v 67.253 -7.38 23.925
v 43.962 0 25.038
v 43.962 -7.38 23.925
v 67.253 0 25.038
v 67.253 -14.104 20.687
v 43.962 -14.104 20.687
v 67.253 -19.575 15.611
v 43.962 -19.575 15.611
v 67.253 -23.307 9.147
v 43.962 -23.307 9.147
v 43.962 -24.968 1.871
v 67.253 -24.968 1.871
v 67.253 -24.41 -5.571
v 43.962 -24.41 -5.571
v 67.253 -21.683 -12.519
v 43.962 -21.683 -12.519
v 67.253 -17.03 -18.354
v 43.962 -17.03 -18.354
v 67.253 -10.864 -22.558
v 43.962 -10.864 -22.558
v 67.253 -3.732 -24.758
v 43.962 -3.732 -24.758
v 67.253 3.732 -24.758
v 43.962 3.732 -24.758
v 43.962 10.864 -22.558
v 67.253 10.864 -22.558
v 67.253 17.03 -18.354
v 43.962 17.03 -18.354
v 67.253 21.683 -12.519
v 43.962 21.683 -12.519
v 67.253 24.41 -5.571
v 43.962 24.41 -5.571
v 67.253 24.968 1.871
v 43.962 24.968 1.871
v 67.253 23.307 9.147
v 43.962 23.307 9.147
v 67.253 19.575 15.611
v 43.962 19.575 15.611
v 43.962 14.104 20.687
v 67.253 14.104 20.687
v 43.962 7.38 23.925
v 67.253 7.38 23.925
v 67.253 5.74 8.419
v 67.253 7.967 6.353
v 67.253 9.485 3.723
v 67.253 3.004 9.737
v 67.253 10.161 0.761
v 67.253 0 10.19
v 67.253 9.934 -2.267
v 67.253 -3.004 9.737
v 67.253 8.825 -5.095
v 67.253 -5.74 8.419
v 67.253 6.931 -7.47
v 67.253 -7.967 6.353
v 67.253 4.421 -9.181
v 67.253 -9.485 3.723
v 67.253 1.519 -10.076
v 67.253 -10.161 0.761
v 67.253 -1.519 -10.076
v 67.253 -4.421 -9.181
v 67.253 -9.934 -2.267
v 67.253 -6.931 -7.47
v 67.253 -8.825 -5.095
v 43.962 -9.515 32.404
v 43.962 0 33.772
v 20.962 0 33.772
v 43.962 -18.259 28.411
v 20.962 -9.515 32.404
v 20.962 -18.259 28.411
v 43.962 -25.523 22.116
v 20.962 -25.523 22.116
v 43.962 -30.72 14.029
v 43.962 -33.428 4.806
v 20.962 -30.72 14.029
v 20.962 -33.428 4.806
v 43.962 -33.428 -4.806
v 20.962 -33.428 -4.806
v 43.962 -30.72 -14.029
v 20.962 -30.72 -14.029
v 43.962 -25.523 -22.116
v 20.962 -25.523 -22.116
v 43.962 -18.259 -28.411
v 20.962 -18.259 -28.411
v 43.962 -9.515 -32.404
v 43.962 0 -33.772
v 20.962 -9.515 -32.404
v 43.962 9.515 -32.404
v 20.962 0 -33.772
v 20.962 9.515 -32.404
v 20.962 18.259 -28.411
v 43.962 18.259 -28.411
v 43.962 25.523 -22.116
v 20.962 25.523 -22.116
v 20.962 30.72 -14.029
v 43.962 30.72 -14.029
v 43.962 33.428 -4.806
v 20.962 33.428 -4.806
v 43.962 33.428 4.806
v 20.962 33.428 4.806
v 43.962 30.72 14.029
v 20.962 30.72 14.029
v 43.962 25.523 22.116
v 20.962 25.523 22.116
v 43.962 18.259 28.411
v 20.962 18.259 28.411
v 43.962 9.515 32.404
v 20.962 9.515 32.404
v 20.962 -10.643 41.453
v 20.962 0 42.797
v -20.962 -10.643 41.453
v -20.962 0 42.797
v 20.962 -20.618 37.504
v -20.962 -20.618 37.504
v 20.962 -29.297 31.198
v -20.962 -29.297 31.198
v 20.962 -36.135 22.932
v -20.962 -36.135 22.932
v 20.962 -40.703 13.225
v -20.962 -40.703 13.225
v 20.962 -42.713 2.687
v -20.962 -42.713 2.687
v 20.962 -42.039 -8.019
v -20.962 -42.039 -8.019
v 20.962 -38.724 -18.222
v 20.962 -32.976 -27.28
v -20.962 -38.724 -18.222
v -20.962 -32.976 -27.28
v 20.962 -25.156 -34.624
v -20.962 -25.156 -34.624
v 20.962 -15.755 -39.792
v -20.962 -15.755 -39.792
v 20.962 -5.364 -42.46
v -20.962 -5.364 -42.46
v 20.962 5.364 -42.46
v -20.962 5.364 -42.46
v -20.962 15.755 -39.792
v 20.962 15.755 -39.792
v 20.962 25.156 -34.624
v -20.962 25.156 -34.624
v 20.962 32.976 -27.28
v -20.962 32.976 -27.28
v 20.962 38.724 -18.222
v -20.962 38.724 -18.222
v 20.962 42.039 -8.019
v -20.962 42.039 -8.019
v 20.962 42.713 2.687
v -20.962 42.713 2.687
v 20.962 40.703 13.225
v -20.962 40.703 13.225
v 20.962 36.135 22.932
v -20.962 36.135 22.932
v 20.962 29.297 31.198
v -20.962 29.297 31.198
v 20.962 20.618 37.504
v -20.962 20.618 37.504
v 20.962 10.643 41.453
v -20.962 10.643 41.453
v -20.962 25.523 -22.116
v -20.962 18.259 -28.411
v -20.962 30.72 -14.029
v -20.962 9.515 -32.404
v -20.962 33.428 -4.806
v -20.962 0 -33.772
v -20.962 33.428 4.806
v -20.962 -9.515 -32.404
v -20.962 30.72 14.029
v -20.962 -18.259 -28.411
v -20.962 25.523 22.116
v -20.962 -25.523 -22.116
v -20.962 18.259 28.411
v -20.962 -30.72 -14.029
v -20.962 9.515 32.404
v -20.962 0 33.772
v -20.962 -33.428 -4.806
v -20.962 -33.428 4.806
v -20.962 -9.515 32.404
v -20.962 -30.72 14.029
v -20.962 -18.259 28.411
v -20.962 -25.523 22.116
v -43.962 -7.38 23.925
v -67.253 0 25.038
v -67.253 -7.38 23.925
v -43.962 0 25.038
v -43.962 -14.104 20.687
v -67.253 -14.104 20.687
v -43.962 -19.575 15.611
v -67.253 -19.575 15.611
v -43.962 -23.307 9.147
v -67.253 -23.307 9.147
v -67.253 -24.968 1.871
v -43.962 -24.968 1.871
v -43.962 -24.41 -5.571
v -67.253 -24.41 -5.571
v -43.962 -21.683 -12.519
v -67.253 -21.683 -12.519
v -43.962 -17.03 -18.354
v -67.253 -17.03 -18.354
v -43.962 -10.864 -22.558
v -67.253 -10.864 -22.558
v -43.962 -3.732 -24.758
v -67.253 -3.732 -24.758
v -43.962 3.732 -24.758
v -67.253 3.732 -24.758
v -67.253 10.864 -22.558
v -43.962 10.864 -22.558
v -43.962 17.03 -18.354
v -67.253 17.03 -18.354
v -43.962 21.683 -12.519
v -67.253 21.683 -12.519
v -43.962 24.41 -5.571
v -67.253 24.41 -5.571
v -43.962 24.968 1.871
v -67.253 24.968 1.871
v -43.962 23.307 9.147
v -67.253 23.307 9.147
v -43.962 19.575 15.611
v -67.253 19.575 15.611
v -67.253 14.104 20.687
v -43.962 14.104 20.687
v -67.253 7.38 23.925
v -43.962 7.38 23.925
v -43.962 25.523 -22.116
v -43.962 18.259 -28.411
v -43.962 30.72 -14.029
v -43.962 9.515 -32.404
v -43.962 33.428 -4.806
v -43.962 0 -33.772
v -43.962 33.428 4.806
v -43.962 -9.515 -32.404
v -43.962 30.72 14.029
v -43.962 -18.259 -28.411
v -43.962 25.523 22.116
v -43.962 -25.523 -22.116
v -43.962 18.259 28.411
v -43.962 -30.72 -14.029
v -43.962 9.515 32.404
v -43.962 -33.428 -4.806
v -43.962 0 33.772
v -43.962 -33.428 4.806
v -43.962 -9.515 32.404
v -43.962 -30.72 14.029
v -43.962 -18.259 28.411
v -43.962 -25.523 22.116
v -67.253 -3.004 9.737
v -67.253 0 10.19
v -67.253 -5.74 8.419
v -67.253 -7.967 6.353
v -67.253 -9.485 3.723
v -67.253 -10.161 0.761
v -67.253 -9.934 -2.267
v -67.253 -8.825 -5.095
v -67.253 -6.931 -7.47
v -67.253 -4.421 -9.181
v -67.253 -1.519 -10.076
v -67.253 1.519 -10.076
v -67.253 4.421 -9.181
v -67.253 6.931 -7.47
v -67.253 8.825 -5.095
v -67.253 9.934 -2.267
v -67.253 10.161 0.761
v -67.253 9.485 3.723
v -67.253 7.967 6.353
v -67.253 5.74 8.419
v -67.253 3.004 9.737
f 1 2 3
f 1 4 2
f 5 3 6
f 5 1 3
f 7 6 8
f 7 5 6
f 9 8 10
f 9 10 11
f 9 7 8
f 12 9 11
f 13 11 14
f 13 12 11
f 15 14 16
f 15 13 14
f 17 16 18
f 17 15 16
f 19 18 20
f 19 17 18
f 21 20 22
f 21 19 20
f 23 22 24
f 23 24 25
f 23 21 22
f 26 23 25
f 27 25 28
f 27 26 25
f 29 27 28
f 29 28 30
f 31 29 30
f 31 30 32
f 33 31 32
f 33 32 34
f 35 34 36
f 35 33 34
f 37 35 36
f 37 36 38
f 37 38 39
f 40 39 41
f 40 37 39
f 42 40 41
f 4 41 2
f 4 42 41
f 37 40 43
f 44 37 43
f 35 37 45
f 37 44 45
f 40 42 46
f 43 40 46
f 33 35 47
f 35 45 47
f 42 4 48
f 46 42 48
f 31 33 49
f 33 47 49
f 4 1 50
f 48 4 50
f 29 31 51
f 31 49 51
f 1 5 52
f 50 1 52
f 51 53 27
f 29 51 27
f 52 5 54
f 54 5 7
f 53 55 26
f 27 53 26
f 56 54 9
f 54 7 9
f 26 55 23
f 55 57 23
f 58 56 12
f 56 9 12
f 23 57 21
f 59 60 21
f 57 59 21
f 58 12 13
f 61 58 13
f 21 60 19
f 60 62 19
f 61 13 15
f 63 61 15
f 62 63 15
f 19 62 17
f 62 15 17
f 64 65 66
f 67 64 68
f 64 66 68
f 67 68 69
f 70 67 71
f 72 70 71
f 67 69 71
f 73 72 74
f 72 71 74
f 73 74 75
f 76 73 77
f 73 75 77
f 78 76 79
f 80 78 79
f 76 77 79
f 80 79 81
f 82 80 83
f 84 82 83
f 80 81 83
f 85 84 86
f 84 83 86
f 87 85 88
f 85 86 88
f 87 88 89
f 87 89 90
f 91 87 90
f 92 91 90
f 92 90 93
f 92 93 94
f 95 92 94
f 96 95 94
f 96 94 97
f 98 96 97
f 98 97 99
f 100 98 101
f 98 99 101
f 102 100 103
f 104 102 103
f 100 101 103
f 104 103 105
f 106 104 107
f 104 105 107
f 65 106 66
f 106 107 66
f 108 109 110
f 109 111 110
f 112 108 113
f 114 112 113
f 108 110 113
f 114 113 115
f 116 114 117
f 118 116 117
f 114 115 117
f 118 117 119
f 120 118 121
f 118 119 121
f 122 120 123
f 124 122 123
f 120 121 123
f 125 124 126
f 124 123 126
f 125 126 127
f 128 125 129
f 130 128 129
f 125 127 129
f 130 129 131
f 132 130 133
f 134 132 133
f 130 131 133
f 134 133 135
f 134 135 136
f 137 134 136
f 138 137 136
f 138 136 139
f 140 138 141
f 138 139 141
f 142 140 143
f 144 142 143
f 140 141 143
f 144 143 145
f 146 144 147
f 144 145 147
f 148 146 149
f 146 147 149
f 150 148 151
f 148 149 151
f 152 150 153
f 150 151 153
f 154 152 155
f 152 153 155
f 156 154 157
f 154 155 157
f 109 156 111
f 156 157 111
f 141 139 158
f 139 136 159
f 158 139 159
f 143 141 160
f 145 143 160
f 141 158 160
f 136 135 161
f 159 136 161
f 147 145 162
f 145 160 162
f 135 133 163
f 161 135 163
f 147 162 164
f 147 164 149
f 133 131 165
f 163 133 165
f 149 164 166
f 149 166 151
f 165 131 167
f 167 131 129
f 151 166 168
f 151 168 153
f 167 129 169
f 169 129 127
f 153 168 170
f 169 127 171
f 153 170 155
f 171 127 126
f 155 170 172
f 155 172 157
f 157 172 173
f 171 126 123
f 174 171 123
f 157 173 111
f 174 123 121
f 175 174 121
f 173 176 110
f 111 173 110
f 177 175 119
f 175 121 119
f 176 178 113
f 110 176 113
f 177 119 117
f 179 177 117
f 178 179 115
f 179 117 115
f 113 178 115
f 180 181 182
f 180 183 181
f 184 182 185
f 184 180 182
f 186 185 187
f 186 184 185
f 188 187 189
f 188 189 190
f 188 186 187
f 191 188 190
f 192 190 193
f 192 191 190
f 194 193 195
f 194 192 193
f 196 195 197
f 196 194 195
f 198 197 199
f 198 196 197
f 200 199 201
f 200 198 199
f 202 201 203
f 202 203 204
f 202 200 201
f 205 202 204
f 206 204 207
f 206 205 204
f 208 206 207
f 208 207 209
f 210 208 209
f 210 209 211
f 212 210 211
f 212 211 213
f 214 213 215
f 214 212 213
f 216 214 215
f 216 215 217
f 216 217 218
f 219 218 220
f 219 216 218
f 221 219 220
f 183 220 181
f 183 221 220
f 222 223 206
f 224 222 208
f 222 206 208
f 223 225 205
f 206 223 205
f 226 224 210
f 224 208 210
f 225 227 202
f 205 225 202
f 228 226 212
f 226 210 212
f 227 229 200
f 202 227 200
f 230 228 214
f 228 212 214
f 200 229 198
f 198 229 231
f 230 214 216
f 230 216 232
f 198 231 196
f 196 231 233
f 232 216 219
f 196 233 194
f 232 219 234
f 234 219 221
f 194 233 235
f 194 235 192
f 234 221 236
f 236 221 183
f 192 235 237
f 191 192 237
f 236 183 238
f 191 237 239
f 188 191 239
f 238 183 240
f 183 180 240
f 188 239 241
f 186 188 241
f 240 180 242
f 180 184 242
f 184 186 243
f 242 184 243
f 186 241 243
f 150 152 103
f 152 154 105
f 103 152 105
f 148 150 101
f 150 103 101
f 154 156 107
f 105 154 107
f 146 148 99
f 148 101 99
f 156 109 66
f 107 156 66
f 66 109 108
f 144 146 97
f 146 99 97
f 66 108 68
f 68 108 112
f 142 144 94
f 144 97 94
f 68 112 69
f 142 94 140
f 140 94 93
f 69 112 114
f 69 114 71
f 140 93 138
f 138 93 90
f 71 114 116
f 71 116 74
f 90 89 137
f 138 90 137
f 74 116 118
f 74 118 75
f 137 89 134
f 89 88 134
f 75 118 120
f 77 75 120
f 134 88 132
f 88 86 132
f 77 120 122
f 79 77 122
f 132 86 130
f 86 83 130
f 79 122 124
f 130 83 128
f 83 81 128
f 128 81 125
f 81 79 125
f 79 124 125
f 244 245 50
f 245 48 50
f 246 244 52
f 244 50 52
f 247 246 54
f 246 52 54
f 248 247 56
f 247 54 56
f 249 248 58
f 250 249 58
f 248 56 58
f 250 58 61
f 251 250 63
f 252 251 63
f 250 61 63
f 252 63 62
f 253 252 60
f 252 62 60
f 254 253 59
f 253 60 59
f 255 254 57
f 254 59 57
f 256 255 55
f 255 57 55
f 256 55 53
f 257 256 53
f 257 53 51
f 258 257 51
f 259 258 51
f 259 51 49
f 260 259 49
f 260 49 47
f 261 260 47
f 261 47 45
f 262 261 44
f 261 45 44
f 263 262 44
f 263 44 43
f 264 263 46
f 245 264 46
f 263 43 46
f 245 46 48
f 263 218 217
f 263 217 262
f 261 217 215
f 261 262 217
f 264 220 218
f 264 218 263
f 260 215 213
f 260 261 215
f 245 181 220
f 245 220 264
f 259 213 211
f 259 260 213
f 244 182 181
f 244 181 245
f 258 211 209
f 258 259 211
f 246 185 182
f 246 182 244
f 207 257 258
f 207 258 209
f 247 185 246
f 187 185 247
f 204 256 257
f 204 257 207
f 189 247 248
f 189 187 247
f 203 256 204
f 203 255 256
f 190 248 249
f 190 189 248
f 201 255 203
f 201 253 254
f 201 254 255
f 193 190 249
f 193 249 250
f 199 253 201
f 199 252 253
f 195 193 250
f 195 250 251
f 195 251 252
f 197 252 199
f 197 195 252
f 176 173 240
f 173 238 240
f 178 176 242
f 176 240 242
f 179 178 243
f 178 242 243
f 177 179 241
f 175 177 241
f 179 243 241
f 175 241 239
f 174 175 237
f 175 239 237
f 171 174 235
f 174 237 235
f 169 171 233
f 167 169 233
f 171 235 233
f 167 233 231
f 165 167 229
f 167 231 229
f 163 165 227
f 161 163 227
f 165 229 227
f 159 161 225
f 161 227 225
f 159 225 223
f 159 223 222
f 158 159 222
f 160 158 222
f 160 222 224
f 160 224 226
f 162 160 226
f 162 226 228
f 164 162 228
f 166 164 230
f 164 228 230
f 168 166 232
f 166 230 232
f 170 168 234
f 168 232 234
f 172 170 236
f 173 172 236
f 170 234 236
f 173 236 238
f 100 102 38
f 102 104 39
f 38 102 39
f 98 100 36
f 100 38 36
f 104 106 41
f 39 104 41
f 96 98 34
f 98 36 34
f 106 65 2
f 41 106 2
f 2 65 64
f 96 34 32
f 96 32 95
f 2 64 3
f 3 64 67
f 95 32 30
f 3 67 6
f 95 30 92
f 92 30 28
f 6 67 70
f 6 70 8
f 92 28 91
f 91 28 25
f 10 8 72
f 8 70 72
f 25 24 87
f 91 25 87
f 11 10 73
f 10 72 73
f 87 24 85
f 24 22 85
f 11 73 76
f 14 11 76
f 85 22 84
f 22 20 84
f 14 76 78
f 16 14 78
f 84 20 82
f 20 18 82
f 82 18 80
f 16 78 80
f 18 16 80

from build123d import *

# Parameters (mm, degrees)
F0_W = 23.291029
F0_H = 14.848028


with BuildPart() as f1:
    # F0 (on Front) → F1 (revolve)
    with BuildSketch(Plane.XZ):
        Polygon((20.961925, 42.797264), (0, 42.797264), (0, 10.189825), (20.961925, 10.189825), (20.961925, 33.771988), align=None)
        Polygon((-43.961816, 10.189825), (-20.961925, 10.189825), (-20.961925, 33.771988), (-43.961816, 33.771988), (-43.961816, 25.037853), align=None)
        with Locations((-55.60733, 17.613839)):
            Rectangle(F0_W, F0_H)
        Polygon((0, 10.189825), (0, 42.797264), (-20.961925, 42.797264), (-20.961925, 33.771988), (-20.961925, 10.189825), align=None)
        Polygon((43.961816, 33.771988), (20.961925, 33.771988), (20.961925, 10.189825), (43.961816, 10.189825), (43.961816, 25.037853), align=None)
        with Locations((55.60733, 17.613839)):
            Rectangle(F0_W, F0_H)
    revolve(axis=Axis((-8.734133, 0, 0), (1, 0, 0)))


solid = f1.part
